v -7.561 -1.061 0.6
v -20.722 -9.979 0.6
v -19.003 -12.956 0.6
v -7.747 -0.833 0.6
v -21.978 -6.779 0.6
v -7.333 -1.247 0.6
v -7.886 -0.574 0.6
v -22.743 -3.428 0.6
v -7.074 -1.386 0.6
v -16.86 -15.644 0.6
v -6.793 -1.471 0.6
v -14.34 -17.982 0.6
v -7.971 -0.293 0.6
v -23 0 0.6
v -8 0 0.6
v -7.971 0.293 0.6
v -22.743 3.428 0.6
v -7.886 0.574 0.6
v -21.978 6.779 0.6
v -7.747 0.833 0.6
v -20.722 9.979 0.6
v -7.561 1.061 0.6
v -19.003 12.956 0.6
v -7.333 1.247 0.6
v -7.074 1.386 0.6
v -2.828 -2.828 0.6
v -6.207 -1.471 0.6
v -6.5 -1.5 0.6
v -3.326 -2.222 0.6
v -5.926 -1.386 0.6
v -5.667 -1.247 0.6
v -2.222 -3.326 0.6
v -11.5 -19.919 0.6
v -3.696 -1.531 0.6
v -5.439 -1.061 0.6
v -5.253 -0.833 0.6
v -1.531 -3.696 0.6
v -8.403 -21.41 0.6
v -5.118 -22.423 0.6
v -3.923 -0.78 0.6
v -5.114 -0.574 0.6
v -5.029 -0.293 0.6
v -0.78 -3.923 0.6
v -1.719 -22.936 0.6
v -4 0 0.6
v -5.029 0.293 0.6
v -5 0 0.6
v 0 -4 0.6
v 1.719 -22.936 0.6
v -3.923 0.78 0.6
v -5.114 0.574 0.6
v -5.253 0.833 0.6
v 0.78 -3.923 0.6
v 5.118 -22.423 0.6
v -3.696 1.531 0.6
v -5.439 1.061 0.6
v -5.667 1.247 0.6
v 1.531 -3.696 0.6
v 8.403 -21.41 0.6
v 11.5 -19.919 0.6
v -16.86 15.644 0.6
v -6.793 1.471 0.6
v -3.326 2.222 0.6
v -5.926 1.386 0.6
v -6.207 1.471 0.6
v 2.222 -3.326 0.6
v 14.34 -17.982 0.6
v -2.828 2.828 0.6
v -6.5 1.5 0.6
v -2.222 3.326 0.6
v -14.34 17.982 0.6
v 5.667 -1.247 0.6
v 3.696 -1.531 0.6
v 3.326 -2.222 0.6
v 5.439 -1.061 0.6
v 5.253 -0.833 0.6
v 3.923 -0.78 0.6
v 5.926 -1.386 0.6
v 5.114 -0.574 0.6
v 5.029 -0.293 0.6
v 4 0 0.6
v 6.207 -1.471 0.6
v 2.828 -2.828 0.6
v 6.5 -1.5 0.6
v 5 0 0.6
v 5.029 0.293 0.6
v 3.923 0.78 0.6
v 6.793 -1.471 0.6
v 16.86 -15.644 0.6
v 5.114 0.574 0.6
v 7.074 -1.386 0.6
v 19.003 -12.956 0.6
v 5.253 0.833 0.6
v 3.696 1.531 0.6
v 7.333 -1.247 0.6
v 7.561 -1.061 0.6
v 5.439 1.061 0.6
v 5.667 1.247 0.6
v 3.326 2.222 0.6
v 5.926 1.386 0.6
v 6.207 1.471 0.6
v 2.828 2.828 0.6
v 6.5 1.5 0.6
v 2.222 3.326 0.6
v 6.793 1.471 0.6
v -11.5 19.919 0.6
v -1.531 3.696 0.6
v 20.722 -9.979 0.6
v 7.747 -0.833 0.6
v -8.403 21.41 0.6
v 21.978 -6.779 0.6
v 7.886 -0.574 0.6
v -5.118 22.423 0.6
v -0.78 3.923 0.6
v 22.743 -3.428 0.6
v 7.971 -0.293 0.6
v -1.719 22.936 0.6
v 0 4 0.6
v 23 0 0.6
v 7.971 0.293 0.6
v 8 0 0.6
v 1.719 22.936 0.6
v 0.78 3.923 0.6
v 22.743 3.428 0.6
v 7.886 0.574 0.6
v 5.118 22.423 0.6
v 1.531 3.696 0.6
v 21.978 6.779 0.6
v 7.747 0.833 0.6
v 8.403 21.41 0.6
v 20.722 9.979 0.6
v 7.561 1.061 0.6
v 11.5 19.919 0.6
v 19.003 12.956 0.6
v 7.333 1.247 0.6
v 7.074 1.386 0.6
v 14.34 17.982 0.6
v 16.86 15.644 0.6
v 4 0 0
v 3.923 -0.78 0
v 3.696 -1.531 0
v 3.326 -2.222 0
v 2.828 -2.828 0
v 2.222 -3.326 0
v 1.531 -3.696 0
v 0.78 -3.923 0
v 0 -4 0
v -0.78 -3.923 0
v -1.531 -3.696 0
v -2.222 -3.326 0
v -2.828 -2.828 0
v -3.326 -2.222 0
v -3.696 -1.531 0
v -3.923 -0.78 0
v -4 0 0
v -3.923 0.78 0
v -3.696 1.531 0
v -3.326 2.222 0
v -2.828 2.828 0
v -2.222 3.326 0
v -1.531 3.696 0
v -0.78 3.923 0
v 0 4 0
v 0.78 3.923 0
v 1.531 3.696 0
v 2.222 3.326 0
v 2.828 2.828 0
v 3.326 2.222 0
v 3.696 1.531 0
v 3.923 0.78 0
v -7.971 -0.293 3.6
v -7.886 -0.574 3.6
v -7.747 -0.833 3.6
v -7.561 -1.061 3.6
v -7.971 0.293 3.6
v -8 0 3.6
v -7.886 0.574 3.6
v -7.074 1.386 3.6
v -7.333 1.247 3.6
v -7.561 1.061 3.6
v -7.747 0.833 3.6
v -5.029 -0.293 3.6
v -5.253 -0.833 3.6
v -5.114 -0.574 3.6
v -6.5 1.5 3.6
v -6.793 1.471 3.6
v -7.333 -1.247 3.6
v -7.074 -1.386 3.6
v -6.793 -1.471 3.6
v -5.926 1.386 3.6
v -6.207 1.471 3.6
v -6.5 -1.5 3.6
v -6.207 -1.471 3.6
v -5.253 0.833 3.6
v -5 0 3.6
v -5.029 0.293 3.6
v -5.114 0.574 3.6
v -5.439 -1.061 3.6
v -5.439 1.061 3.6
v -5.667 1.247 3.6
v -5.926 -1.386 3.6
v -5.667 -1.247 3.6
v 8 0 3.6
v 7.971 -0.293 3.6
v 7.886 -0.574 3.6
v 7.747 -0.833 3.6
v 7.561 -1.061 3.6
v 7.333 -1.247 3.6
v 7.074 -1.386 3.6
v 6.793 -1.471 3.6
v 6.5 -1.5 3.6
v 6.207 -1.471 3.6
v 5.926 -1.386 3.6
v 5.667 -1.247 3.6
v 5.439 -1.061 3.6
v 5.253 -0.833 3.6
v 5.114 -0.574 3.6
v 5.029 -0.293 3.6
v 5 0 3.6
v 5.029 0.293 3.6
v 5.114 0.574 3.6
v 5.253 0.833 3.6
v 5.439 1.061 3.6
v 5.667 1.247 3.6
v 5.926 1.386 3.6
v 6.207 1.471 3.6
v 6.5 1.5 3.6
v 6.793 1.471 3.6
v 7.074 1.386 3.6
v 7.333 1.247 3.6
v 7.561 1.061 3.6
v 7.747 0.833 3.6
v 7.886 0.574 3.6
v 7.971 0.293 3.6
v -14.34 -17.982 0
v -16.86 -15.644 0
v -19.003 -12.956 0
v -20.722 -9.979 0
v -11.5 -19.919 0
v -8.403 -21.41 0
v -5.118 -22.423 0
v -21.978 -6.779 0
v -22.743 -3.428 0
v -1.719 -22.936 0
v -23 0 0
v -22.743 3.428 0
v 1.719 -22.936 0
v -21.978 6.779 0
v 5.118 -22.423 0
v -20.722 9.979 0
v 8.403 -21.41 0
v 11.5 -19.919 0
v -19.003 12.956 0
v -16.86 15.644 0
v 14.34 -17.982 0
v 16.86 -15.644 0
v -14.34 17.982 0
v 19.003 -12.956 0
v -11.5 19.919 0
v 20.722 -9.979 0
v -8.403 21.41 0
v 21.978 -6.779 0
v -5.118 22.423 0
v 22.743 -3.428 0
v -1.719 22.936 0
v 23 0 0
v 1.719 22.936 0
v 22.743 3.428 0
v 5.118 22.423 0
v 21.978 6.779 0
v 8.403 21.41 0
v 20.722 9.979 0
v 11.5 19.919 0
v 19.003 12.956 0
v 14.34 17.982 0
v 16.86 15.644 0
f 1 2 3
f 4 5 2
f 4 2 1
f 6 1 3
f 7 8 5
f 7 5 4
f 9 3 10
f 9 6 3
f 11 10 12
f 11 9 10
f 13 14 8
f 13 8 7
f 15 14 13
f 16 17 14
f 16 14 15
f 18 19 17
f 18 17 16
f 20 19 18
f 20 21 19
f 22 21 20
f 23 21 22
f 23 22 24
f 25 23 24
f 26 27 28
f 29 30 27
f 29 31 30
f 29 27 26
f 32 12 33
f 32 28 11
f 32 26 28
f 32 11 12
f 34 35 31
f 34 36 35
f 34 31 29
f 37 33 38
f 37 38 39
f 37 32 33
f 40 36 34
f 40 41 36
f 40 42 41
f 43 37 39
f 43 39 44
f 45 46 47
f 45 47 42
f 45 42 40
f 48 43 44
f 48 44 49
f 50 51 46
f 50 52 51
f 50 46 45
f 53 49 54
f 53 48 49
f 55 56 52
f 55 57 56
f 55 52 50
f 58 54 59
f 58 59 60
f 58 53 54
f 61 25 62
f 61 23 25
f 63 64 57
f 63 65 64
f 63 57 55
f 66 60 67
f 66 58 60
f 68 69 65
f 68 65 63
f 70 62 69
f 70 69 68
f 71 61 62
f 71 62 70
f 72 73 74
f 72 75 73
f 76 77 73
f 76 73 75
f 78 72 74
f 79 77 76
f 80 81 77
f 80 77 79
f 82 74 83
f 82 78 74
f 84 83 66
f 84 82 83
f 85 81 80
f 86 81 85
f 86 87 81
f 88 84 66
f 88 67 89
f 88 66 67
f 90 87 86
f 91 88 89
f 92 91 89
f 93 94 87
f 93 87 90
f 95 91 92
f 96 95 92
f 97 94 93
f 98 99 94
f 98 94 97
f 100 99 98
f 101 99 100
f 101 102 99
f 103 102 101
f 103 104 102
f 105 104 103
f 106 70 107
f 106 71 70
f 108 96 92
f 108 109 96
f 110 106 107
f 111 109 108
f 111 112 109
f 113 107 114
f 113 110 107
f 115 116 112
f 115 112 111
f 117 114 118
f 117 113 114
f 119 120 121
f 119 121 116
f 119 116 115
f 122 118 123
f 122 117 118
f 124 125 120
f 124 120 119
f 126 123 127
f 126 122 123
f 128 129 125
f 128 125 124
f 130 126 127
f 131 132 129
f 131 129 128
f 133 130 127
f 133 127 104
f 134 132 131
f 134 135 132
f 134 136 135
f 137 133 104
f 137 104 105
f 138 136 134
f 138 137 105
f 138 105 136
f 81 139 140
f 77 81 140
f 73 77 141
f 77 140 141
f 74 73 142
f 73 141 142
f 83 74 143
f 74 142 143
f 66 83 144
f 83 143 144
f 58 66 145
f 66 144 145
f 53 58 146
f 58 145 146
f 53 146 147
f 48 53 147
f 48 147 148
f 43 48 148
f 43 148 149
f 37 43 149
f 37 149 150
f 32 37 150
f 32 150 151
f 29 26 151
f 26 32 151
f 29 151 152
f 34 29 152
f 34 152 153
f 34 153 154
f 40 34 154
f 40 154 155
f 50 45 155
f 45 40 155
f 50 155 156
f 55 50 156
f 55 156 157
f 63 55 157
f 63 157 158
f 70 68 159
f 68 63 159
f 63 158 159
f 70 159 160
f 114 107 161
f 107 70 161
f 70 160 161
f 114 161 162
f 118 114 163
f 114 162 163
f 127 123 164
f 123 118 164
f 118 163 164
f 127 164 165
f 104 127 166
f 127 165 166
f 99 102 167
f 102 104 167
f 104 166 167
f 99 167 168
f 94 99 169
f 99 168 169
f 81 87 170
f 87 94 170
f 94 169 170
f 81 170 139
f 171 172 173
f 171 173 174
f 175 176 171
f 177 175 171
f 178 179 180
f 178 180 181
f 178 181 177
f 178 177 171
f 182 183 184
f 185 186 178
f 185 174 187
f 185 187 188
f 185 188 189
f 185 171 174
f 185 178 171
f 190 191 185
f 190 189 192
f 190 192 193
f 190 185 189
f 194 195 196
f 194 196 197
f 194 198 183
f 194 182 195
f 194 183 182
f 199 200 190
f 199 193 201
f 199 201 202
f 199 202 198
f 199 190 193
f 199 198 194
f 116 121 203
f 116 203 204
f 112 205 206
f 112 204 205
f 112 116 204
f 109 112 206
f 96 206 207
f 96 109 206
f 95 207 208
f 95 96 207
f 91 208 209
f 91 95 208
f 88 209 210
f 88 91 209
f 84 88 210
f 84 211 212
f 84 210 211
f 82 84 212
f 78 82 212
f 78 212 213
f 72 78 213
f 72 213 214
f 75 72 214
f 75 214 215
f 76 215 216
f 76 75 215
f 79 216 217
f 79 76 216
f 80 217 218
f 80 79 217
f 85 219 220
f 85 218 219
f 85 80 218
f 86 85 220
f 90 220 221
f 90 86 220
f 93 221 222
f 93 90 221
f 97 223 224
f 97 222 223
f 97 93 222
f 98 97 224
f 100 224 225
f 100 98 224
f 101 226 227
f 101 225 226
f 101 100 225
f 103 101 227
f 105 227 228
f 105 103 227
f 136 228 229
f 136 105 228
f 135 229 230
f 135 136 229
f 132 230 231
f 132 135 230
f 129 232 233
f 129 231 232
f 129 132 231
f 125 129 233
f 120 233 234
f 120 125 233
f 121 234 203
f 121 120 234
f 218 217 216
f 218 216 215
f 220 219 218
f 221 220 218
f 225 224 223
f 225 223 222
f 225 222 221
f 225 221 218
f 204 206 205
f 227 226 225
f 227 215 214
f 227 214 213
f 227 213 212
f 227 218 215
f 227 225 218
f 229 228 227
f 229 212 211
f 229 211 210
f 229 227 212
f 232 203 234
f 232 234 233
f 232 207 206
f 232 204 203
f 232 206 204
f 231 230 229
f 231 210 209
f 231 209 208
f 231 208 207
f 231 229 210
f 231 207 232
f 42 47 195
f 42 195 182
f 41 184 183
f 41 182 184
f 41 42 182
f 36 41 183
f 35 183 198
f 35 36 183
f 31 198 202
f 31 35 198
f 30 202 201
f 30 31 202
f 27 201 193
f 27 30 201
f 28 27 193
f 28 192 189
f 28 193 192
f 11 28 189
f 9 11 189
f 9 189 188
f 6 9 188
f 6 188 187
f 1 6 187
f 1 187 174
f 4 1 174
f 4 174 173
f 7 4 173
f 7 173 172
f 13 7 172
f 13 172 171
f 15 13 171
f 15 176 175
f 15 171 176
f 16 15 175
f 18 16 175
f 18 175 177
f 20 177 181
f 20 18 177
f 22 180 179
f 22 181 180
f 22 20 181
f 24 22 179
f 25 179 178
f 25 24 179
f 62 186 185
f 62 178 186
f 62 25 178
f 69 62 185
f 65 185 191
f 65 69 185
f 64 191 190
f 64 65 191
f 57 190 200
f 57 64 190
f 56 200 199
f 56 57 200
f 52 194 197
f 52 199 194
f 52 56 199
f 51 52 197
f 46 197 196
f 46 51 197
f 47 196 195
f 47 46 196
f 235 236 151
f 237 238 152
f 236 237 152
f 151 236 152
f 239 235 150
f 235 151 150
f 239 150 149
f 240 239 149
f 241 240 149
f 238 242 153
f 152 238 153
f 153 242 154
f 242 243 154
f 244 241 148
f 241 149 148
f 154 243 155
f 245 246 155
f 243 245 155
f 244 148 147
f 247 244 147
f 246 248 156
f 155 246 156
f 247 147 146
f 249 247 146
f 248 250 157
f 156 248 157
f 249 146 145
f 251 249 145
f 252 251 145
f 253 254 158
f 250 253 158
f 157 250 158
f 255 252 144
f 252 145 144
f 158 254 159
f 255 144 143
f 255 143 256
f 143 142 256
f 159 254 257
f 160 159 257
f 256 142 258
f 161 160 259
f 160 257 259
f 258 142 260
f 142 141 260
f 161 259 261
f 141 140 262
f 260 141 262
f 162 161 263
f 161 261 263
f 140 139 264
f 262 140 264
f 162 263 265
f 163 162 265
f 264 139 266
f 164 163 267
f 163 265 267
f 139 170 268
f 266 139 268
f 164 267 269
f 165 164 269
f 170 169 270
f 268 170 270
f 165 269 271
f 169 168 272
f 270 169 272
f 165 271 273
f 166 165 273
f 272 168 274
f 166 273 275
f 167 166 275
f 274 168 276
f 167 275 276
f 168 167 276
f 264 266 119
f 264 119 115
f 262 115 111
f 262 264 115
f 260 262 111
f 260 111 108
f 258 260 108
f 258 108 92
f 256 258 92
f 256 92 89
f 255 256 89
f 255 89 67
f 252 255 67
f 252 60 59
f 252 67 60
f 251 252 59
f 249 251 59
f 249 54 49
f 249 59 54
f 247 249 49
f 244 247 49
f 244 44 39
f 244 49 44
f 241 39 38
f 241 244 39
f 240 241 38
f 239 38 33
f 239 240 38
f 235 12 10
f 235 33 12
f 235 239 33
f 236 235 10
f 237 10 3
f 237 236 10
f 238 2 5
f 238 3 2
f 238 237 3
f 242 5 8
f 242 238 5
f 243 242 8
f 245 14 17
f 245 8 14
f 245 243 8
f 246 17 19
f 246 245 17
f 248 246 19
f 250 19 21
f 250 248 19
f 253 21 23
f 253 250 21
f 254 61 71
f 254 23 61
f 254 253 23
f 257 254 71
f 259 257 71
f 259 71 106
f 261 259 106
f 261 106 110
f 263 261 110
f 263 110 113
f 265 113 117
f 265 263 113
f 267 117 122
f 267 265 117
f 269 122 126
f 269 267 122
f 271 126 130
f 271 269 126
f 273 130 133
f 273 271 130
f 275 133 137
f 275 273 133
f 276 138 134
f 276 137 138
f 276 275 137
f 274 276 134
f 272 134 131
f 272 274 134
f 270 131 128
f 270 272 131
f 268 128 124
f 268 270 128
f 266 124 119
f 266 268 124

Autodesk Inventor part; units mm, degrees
ref_plane "YZ Plane" through (0, 0, 0) normal (1, 0, 0) x (0, 1, 0)
ref_plane "XZ Plane" through (0, 0, 0) normal (0, 1, 0) x (-1, 0, 0)
ref_plane "XY Plane" through (0, 0, 0) normal (0, 0, 1) x (1, 0, 0)
sketch "スケッチ1" plane through (0, 0, 0) normal (0, 0, 1) x (1, 0, 0)
  circle A0 centre (0, 0) radius 23
  circle A1 centre (0, 0) radius 4
  dimension "d0" = 46
  dimension "d1" = 8
extrude "押し出し1" add sketch "スケッチ1" along normal blind 0.6
sketch "スケッチ2" plane through (0, 0, 0.6) normal (0, 0, 1) x (1, 0, 0)
  circle A0 centre (0, 0) radius 6.5 construction
  circle A1 centre (-6.5, 0) radius 1.5
  circle A2 centre (6.5, 0) radius 1.5
  dimension "d4" = 13
  dimension "d5" = 3
extrude "押し出し2" add sketch "スケッチ2" along normal blind 3
properties part number "SlitDiscSupport2"
